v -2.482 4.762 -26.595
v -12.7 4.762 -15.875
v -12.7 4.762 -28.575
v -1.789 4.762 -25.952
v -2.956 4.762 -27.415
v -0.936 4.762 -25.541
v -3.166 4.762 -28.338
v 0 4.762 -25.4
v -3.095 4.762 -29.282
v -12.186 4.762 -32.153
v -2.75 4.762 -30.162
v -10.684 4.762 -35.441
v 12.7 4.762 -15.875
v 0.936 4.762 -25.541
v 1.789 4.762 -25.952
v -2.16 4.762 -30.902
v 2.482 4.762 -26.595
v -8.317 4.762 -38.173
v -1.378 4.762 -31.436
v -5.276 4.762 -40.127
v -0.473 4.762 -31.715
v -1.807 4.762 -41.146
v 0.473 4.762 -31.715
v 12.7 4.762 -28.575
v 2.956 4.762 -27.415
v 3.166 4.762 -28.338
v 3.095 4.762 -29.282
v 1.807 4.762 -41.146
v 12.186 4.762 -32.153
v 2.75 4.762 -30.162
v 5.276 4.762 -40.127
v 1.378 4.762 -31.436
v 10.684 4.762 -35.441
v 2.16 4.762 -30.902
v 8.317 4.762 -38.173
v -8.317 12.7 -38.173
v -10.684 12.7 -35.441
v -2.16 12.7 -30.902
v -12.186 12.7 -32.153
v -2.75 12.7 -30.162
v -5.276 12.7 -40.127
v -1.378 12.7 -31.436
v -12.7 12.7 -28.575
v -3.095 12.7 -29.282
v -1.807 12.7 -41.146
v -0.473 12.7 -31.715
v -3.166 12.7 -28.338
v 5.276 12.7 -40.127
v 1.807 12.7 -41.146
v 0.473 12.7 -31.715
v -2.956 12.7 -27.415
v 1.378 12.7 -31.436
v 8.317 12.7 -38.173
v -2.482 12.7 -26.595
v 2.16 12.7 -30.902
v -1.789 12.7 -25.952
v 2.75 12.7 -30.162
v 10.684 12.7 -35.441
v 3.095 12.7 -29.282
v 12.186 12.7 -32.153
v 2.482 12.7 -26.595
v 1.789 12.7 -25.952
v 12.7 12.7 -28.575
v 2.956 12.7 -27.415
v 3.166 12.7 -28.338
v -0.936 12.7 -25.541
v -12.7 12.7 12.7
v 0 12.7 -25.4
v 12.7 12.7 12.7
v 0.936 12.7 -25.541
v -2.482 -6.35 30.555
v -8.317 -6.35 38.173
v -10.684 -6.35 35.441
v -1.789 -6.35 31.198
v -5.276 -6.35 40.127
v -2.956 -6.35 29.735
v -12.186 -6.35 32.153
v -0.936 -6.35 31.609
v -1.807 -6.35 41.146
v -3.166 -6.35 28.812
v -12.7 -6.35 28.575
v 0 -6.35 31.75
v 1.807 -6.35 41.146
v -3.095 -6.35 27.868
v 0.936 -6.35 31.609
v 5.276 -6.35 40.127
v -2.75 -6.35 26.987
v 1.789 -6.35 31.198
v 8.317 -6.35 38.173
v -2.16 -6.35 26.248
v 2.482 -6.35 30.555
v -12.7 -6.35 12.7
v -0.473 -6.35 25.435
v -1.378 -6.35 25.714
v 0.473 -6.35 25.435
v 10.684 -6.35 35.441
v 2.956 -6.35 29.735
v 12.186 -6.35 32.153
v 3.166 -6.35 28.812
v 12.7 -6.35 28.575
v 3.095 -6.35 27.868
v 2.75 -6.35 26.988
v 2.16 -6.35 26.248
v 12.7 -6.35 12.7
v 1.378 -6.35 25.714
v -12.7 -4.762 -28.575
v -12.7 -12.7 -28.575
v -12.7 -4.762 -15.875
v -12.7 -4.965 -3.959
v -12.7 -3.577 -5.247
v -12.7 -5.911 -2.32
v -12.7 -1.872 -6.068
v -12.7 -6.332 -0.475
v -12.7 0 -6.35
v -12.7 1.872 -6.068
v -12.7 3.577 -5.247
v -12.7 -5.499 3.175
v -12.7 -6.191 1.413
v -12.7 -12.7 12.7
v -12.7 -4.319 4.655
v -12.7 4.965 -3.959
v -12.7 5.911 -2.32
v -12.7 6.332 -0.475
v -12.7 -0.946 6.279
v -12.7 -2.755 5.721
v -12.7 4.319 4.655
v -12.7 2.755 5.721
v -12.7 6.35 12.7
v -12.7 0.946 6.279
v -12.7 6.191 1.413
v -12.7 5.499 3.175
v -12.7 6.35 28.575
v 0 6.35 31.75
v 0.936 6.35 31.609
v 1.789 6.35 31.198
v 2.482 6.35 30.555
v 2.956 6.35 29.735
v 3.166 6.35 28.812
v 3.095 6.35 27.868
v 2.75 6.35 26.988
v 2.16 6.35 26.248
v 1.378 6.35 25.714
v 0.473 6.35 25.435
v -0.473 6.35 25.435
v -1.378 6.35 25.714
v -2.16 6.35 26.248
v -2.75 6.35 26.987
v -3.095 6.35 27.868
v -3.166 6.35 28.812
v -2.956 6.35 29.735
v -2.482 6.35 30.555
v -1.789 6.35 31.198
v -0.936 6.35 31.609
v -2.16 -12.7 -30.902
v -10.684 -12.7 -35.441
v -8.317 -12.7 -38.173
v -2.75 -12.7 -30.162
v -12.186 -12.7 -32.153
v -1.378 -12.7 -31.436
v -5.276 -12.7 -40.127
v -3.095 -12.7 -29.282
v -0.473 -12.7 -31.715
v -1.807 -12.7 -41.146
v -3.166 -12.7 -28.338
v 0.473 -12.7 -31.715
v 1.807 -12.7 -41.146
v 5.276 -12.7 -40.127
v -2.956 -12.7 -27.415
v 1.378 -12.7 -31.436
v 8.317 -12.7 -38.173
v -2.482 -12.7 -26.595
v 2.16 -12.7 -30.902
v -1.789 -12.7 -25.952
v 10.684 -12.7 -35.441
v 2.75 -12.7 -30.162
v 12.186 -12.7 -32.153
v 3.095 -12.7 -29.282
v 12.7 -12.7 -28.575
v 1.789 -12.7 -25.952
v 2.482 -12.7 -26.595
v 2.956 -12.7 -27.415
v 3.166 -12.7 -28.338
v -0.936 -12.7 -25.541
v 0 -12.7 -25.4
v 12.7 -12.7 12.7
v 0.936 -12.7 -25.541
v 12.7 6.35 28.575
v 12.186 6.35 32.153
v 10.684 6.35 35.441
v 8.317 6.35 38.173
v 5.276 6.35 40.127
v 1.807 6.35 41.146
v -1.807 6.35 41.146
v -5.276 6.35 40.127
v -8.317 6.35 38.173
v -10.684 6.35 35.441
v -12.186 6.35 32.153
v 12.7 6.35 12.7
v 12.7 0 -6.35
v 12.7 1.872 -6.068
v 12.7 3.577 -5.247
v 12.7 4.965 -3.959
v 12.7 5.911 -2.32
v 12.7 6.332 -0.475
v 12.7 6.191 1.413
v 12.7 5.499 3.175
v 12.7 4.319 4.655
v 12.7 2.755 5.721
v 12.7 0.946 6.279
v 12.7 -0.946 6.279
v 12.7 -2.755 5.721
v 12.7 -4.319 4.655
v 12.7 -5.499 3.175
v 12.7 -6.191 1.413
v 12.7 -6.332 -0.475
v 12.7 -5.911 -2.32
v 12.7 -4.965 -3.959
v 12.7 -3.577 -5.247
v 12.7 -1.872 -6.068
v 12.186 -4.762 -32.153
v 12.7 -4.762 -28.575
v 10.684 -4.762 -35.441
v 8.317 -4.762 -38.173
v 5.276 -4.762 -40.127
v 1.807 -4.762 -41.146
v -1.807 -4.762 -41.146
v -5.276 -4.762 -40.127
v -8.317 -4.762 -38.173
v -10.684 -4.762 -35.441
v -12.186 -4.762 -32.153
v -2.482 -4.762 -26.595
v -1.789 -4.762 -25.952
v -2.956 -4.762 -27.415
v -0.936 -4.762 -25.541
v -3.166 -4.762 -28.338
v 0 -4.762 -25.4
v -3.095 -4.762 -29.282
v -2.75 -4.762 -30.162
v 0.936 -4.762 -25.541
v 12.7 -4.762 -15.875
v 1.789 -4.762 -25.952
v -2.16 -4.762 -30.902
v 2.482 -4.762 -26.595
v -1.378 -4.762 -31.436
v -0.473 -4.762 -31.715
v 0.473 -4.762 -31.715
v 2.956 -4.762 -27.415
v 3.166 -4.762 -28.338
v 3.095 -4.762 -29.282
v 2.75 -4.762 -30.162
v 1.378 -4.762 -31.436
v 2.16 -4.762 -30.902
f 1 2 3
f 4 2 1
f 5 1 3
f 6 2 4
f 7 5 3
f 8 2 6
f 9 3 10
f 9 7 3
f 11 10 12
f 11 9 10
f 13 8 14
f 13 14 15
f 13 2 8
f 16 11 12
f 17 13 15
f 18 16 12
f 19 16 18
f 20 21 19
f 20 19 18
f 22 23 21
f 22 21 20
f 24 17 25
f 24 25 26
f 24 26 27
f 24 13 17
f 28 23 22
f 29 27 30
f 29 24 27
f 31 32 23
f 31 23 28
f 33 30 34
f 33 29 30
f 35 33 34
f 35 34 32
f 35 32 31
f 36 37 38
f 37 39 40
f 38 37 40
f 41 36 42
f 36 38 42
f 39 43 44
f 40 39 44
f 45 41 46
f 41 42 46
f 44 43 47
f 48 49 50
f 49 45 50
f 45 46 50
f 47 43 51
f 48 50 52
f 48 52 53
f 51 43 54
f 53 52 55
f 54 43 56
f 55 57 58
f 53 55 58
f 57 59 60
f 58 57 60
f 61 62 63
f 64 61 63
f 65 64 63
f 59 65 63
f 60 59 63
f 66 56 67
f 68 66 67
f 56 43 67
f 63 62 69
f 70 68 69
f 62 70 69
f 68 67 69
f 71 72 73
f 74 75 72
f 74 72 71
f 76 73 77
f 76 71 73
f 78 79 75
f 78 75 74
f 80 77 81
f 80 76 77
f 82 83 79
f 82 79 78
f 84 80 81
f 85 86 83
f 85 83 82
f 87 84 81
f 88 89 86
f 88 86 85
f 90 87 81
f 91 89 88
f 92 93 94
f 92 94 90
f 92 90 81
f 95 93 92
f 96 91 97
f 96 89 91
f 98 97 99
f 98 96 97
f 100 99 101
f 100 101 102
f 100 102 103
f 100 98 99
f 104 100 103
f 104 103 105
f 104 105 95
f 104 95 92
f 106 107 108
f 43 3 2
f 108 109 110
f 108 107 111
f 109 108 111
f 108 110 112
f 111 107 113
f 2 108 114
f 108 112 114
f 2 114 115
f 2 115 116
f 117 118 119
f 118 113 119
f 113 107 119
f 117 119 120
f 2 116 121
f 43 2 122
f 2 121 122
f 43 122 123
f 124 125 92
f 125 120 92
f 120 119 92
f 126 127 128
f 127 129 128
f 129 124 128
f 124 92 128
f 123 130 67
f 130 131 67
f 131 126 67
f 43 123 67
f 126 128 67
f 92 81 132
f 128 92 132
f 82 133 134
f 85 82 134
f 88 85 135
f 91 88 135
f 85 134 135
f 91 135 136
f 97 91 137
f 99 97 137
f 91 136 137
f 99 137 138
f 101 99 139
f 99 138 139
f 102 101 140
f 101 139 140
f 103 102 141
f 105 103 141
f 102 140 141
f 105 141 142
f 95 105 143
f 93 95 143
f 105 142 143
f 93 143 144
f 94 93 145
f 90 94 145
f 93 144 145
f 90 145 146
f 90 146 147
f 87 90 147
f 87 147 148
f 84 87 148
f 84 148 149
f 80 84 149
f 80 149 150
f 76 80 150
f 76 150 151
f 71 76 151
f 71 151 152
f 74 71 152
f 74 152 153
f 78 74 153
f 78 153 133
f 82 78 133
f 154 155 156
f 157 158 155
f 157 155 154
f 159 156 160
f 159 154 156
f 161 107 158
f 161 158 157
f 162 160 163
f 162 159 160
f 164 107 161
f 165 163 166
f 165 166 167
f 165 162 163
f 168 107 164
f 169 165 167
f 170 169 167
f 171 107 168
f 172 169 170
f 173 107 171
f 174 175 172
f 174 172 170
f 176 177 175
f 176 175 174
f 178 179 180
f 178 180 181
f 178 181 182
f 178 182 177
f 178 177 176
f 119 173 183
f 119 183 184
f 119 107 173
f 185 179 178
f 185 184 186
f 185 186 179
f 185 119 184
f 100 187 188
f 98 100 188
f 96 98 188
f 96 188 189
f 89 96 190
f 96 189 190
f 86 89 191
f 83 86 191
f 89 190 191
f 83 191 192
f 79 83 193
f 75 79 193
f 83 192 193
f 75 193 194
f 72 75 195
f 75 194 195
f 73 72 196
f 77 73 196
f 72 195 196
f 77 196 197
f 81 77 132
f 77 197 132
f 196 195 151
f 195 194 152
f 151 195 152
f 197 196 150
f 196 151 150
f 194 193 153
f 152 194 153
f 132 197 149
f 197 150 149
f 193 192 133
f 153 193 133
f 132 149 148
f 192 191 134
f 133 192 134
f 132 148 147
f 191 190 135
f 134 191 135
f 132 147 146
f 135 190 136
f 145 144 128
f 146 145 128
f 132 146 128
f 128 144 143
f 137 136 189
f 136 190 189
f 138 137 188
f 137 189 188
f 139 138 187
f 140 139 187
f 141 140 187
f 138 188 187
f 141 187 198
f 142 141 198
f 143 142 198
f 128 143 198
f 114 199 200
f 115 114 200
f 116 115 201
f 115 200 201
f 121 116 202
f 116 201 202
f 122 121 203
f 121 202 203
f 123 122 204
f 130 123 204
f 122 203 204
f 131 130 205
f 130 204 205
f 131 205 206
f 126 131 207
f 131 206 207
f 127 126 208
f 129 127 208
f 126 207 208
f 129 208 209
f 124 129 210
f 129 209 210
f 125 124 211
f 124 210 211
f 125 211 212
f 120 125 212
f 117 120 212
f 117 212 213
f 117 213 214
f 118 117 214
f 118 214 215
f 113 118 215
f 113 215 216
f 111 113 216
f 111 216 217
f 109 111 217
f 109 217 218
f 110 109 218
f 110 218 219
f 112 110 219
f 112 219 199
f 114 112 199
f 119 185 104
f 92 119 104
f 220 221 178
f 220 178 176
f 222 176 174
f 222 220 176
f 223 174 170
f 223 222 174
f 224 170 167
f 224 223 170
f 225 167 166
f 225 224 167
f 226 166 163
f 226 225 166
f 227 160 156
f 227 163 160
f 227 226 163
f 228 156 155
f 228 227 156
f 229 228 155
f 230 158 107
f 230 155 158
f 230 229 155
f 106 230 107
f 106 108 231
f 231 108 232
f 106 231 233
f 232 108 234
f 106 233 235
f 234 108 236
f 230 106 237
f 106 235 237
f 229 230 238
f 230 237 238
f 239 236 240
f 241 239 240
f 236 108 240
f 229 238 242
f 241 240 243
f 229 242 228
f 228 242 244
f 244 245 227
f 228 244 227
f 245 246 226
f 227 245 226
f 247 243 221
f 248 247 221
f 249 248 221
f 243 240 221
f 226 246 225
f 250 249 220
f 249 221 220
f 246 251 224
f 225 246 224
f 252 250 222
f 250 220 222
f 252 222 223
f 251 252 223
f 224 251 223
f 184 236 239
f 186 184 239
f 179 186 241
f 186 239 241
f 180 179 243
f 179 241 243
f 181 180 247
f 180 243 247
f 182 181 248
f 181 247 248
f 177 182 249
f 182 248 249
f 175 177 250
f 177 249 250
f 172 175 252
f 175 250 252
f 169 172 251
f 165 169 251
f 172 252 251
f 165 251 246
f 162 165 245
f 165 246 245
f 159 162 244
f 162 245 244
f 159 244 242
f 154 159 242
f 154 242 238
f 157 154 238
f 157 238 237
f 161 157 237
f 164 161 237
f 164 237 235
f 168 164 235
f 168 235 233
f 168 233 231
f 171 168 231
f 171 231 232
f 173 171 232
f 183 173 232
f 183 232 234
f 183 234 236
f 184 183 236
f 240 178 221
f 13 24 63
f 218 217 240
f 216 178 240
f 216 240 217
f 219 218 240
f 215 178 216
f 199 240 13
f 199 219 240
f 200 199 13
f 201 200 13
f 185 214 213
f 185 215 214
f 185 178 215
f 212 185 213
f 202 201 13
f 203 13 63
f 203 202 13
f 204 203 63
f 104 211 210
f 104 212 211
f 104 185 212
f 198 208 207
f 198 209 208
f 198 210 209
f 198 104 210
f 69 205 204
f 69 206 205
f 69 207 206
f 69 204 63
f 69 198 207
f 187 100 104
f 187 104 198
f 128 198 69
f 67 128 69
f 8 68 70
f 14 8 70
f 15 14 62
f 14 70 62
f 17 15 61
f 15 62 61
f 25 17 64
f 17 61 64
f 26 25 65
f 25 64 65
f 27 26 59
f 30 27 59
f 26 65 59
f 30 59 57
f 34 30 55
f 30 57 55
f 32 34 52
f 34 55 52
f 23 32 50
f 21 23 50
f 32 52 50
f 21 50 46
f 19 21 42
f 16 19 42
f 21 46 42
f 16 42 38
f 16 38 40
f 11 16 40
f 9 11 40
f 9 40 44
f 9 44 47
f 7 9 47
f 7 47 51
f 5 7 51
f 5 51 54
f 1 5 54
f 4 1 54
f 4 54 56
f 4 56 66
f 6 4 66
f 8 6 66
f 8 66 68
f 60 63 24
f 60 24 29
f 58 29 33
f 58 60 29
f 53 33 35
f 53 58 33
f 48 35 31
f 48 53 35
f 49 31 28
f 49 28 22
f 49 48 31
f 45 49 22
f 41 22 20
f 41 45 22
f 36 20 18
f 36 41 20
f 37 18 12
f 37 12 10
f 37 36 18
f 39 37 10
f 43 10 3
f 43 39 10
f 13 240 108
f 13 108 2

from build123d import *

# Parameters (mm, degrees)
SKETCH2_W           = 25.4
SKETCH2_H           = 25.4
BOSS_EXTRUDE1_DEPTH = 41.275
SKETCH3_R           = 6.35
SKETCH3_W           = 28.575
SKETCH3_H           = 6.35
SKETCH3_W_2         = 25.4
SKETCH3_H_2         = 9.525
CUT_EXTRUDE1_DEPTH  = 51.100654936
SKETCH4_R           = 3.175
CUT_EXTRUDE2_DEPTH  = 51.100654936


with BuildPart() as part:
    # Sketch2 → Boss-Extrude1 (new, symmetric)
    with BuildSketch(Plane.XY):
        Rectangle(SKETCH2_W, SKETCH2_H)
    extrude(amount=BOSS_EXTRUDE1_DEPTH, both=True)

    # Sketch3 → Cut-Extrude1 (cut, through all)
    with BuildSketch(Plane(origin=(12.7, 0, 0), x_dir=(0, 0, -1), z_dir=(1, 0, 0))):
        Circle(SKETCH3_R)
        with Locations((-26.9875, 9.525)):
            Rectangle(SKETCH3_W, SKETCH3_H)
        with Locations((-26.9875, -9.525)):
            Rectangle(SKETCH3_W, SKETCH3_H)
        with Locations((28.575, 0)):
            Rectangle(SKETCH3_W_2, SKETCH3_H_2)
    extrude(amount=-CUT_EXTRUDE1_DEPTH, mode=Mode.SUBTRACT)

    # Sketch4 → Cut-Extrude2 (cut, through all)
    with BuildSketch(Plane(origin=(0, 12.7, 0), x_dir=(1, 0, 0), z_dir=(0, 1, 0))):
        with Locations(Location((0, 28.575, 0), (0, 0, 270))):
            Circle(SKETCH4_R)
        with Locations(Location((0, -28.575, 0), (0, 0, 270))):
            Circle(SKETCH4_R)
        with BuildLine():
            Line((-12.7, 28.575), (-12.7, 47.625))
            Line((-12.7, 47.625), (12.7, 47.625))
            Line((12.7, 47.625), (12.7, 28.575))
            ThreePointArc((12.7, 28.575), (0, 41.275), (-12.7, 28.575))
        make_face()
        with BuildLine():
            Line((-12.7, -28.575), (-12.7, -47.625))
            Line((-12.7, -47.625), (12.7, -47.625))
            Line((12.7, -47.625), (12.7, -28.575))
            ThreePointArc((12.7, -28.575), (0, -41.275), (-12.7, -28.575))
        make_face()
    extrude(amount=-CUT_EXTRUDE2_DEPTH, mode=Mode.SUBTRACT)


solid = part.part
